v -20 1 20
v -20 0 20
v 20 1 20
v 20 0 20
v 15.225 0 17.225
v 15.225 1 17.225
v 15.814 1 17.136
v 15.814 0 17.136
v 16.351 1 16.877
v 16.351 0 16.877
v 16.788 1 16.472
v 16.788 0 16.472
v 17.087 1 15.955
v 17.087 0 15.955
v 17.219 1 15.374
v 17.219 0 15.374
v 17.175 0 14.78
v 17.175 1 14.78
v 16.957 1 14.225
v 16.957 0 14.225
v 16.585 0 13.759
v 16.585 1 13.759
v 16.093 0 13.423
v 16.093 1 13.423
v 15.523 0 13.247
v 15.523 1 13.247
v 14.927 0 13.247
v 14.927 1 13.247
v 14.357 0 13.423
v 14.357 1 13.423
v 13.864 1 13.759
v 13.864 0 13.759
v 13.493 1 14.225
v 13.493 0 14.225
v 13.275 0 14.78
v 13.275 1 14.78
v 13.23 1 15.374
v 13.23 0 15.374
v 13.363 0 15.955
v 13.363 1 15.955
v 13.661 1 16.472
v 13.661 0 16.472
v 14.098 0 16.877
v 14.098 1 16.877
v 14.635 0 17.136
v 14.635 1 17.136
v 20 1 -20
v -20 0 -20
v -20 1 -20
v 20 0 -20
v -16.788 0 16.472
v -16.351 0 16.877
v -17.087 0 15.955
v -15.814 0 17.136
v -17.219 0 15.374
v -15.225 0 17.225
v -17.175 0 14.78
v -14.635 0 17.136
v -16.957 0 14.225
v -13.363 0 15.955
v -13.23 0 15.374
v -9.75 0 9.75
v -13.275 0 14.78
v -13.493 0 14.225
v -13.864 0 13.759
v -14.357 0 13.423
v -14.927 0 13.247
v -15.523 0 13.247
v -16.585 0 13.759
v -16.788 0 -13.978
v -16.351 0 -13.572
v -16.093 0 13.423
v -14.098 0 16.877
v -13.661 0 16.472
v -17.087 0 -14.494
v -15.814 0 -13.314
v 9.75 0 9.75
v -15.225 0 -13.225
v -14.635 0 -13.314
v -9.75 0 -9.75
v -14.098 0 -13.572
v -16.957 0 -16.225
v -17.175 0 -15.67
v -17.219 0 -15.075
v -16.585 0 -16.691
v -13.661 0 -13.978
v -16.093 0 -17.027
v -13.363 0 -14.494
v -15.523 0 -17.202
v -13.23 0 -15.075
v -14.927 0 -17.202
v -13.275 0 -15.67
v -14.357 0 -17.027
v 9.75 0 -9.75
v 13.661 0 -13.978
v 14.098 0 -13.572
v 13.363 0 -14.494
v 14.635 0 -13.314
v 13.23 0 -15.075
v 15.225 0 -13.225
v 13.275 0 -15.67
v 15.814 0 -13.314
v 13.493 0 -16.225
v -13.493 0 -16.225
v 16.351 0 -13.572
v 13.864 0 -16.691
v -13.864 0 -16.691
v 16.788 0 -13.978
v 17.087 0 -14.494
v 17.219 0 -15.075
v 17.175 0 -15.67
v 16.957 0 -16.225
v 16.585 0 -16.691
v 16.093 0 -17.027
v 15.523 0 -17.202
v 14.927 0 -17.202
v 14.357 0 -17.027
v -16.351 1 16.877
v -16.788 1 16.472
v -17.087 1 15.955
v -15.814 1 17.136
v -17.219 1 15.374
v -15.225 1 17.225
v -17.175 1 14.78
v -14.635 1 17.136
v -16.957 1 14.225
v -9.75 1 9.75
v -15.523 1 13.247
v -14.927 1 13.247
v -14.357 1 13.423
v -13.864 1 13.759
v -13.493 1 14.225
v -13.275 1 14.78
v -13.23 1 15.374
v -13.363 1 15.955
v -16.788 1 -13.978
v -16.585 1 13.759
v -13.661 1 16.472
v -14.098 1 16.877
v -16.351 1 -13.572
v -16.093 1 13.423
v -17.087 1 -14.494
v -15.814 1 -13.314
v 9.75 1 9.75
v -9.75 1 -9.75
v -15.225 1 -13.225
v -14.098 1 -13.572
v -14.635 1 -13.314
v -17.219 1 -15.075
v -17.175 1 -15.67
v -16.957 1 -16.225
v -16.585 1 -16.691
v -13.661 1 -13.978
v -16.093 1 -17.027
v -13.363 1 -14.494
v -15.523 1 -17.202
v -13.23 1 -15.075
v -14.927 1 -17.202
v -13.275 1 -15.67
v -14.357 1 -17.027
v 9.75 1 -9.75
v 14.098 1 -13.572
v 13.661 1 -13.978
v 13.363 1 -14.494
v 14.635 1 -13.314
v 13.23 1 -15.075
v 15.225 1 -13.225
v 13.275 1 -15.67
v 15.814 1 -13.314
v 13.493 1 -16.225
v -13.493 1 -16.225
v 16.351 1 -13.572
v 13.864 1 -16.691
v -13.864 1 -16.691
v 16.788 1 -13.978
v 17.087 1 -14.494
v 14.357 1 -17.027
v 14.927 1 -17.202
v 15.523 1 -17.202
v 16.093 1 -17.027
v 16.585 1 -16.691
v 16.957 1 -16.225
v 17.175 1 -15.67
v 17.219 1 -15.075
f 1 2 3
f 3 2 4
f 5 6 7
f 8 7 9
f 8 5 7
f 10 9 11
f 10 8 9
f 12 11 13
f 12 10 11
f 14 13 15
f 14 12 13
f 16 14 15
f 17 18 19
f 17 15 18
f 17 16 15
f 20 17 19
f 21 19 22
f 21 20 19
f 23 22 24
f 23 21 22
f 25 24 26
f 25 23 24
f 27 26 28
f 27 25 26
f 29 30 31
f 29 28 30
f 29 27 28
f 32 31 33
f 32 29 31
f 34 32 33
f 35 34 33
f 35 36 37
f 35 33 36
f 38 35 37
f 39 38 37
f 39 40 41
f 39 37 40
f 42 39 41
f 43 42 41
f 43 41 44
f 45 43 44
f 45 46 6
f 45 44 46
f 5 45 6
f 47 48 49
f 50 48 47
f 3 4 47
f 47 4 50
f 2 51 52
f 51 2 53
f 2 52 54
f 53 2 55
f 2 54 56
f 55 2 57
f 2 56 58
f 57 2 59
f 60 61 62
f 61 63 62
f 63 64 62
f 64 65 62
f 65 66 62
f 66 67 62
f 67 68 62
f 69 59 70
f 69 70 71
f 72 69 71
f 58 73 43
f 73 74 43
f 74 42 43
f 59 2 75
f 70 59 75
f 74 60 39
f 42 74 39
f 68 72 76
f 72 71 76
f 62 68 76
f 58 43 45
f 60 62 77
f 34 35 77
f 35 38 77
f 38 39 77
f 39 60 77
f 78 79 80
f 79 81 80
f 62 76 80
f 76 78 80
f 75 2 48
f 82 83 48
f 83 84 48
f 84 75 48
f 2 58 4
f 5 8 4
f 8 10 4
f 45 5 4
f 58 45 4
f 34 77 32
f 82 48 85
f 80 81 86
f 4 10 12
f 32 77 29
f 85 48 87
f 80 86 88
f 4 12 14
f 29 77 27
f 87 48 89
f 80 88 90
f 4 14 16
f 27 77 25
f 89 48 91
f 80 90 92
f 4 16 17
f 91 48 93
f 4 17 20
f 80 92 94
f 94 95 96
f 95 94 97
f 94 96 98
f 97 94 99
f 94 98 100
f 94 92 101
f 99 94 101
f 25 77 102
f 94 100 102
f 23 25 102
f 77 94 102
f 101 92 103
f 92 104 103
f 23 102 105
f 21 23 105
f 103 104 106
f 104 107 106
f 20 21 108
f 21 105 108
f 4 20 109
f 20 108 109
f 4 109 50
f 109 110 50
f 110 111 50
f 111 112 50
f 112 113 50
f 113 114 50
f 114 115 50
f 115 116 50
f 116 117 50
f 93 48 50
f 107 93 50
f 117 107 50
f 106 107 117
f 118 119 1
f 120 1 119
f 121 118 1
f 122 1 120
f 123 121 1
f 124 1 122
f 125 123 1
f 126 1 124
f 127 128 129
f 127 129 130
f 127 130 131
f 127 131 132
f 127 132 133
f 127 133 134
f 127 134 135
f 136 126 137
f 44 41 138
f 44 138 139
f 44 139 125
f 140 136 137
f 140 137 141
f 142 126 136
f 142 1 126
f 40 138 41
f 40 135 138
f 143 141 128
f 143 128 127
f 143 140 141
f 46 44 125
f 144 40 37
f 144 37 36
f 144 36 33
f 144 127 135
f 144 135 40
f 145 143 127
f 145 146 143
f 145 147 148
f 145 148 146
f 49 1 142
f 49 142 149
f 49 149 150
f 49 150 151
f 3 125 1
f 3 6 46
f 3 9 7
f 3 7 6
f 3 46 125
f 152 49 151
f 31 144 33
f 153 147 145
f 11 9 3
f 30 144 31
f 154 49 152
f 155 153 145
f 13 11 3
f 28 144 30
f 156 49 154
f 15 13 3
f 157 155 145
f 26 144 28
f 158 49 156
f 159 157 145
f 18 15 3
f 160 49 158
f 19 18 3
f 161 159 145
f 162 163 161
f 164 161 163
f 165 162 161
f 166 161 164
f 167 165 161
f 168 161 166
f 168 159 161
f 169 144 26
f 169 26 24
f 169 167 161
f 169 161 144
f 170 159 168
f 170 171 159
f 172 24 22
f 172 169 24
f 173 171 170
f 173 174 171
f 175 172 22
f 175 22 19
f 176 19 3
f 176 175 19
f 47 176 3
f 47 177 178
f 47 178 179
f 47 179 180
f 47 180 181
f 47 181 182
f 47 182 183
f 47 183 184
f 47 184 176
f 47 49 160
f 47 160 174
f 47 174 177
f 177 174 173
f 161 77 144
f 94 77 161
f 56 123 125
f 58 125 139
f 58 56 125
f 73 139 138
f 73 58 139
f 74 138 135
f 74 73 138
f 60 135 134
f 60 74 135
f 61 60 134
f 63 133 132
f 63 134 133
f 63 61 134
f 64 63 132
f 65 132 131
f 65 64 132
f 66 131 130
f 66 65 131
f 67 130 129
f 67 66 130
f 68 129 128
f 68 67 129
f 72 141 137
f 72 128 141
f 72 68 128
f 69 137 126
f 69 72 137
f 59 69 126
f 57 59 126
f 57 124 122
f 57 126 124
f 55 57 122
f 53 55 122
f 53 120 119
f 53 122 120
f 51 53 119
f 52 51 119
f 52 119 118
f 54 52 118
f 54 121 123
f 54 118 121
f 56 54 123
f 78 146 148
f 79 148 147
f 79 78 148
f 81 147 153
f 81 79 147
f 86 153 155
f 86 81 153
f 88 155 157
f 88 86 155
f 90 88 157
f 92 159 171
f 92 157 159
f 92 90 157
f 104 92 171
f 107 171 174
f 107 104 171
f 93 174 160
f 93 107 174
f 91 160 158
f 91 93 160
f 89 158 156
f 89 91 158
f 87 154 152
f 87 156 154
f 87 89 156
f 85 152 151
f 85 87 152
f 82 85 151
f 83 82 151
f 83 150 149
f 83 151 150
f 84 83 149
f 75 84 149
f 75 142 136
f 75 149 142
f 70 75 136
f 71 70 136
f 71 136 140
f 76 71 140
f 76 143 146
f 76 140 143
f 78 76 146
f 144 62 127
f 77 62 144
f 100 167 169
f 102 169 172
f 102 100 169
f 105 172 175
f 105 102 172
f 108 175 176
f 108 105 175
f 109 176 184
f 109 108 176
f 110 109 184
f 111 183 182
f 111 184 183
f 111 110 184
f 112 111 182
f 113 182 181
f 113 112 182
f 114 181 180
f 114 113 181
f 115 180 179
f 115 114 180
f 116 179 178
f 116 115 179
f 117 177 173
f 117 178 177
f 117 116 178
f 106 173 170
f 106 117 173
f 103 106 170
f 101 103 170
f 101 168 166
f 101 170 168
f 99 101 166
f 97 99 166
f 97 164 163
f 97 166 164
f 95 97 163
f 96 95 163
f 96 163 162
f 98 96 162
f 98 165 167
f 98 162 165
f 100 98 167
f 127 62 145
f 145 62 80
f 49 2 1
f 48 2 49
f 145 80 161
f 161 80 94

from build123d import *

# Parameters (mm, degrees)
SKETCH_2_W          = 40
SKETCH_2_H          = 40
EXTRUDE_2_DEPTH     = 1
SKETCH_3_R          = 2
CUT_EXTRUDE_2_DEPTH = 10
SKETCH_2_10_W       = 19.5
SKETCH_2_10_H       = 19.5
CUT_EXTRUDE_3_DEPTH = 10


with BuildPart() as part:
    # 草图2 → 凸台-拉伸2 (new body)
    with BuildSketch(Plane(origin=(0, 0, 0), x_dir=(1, 0, 0), z_dir=(0, 1, 0))):
        Rectangle(SKETCH_2_W, SKETCH_2_H)
    extrude(amount=EXTRUDE_2_DEPTH)

    # 草图3 → 切除-拉伸2 (cut)
    with BuildSketch(Plane(origin=(0, 0, 0), x_dir=(1, 0, 0), z_dir=(0, 1, 0))):
        with Locations((-15.224798987, -15.224798987)):
            Circle(SKETCH_3_R)
        with Locations((15.224798987, -15.224798987)):
            Circle(SKETCH_3_R)
        with Locations((15.224798987, 15.224798987)):
            Circle(SKETCH_3_R)
        with Locations((-15.224798987, 15.224798987)):
            Circle(SKETCH_3_R)
    extrude(amount=CUT_EXTRUDE_2_DEPTH, mode=Mode.SUBTRACT)

    # 草图2<10> → 切除-拉伸3 (cut)
    with BuildSketch(Plane(origin=(0, 0, 0), x_dir=(1, 0, 0), z_dir=(0, 1, 0))):
        Rectangle(SKETCH_2_10_W, SKETCH_2_10_H)
    extrude(amount=CUT_EXTRUDE_3_DEPTH, mode=Mode.SUBTRACT)


solid = part.part
